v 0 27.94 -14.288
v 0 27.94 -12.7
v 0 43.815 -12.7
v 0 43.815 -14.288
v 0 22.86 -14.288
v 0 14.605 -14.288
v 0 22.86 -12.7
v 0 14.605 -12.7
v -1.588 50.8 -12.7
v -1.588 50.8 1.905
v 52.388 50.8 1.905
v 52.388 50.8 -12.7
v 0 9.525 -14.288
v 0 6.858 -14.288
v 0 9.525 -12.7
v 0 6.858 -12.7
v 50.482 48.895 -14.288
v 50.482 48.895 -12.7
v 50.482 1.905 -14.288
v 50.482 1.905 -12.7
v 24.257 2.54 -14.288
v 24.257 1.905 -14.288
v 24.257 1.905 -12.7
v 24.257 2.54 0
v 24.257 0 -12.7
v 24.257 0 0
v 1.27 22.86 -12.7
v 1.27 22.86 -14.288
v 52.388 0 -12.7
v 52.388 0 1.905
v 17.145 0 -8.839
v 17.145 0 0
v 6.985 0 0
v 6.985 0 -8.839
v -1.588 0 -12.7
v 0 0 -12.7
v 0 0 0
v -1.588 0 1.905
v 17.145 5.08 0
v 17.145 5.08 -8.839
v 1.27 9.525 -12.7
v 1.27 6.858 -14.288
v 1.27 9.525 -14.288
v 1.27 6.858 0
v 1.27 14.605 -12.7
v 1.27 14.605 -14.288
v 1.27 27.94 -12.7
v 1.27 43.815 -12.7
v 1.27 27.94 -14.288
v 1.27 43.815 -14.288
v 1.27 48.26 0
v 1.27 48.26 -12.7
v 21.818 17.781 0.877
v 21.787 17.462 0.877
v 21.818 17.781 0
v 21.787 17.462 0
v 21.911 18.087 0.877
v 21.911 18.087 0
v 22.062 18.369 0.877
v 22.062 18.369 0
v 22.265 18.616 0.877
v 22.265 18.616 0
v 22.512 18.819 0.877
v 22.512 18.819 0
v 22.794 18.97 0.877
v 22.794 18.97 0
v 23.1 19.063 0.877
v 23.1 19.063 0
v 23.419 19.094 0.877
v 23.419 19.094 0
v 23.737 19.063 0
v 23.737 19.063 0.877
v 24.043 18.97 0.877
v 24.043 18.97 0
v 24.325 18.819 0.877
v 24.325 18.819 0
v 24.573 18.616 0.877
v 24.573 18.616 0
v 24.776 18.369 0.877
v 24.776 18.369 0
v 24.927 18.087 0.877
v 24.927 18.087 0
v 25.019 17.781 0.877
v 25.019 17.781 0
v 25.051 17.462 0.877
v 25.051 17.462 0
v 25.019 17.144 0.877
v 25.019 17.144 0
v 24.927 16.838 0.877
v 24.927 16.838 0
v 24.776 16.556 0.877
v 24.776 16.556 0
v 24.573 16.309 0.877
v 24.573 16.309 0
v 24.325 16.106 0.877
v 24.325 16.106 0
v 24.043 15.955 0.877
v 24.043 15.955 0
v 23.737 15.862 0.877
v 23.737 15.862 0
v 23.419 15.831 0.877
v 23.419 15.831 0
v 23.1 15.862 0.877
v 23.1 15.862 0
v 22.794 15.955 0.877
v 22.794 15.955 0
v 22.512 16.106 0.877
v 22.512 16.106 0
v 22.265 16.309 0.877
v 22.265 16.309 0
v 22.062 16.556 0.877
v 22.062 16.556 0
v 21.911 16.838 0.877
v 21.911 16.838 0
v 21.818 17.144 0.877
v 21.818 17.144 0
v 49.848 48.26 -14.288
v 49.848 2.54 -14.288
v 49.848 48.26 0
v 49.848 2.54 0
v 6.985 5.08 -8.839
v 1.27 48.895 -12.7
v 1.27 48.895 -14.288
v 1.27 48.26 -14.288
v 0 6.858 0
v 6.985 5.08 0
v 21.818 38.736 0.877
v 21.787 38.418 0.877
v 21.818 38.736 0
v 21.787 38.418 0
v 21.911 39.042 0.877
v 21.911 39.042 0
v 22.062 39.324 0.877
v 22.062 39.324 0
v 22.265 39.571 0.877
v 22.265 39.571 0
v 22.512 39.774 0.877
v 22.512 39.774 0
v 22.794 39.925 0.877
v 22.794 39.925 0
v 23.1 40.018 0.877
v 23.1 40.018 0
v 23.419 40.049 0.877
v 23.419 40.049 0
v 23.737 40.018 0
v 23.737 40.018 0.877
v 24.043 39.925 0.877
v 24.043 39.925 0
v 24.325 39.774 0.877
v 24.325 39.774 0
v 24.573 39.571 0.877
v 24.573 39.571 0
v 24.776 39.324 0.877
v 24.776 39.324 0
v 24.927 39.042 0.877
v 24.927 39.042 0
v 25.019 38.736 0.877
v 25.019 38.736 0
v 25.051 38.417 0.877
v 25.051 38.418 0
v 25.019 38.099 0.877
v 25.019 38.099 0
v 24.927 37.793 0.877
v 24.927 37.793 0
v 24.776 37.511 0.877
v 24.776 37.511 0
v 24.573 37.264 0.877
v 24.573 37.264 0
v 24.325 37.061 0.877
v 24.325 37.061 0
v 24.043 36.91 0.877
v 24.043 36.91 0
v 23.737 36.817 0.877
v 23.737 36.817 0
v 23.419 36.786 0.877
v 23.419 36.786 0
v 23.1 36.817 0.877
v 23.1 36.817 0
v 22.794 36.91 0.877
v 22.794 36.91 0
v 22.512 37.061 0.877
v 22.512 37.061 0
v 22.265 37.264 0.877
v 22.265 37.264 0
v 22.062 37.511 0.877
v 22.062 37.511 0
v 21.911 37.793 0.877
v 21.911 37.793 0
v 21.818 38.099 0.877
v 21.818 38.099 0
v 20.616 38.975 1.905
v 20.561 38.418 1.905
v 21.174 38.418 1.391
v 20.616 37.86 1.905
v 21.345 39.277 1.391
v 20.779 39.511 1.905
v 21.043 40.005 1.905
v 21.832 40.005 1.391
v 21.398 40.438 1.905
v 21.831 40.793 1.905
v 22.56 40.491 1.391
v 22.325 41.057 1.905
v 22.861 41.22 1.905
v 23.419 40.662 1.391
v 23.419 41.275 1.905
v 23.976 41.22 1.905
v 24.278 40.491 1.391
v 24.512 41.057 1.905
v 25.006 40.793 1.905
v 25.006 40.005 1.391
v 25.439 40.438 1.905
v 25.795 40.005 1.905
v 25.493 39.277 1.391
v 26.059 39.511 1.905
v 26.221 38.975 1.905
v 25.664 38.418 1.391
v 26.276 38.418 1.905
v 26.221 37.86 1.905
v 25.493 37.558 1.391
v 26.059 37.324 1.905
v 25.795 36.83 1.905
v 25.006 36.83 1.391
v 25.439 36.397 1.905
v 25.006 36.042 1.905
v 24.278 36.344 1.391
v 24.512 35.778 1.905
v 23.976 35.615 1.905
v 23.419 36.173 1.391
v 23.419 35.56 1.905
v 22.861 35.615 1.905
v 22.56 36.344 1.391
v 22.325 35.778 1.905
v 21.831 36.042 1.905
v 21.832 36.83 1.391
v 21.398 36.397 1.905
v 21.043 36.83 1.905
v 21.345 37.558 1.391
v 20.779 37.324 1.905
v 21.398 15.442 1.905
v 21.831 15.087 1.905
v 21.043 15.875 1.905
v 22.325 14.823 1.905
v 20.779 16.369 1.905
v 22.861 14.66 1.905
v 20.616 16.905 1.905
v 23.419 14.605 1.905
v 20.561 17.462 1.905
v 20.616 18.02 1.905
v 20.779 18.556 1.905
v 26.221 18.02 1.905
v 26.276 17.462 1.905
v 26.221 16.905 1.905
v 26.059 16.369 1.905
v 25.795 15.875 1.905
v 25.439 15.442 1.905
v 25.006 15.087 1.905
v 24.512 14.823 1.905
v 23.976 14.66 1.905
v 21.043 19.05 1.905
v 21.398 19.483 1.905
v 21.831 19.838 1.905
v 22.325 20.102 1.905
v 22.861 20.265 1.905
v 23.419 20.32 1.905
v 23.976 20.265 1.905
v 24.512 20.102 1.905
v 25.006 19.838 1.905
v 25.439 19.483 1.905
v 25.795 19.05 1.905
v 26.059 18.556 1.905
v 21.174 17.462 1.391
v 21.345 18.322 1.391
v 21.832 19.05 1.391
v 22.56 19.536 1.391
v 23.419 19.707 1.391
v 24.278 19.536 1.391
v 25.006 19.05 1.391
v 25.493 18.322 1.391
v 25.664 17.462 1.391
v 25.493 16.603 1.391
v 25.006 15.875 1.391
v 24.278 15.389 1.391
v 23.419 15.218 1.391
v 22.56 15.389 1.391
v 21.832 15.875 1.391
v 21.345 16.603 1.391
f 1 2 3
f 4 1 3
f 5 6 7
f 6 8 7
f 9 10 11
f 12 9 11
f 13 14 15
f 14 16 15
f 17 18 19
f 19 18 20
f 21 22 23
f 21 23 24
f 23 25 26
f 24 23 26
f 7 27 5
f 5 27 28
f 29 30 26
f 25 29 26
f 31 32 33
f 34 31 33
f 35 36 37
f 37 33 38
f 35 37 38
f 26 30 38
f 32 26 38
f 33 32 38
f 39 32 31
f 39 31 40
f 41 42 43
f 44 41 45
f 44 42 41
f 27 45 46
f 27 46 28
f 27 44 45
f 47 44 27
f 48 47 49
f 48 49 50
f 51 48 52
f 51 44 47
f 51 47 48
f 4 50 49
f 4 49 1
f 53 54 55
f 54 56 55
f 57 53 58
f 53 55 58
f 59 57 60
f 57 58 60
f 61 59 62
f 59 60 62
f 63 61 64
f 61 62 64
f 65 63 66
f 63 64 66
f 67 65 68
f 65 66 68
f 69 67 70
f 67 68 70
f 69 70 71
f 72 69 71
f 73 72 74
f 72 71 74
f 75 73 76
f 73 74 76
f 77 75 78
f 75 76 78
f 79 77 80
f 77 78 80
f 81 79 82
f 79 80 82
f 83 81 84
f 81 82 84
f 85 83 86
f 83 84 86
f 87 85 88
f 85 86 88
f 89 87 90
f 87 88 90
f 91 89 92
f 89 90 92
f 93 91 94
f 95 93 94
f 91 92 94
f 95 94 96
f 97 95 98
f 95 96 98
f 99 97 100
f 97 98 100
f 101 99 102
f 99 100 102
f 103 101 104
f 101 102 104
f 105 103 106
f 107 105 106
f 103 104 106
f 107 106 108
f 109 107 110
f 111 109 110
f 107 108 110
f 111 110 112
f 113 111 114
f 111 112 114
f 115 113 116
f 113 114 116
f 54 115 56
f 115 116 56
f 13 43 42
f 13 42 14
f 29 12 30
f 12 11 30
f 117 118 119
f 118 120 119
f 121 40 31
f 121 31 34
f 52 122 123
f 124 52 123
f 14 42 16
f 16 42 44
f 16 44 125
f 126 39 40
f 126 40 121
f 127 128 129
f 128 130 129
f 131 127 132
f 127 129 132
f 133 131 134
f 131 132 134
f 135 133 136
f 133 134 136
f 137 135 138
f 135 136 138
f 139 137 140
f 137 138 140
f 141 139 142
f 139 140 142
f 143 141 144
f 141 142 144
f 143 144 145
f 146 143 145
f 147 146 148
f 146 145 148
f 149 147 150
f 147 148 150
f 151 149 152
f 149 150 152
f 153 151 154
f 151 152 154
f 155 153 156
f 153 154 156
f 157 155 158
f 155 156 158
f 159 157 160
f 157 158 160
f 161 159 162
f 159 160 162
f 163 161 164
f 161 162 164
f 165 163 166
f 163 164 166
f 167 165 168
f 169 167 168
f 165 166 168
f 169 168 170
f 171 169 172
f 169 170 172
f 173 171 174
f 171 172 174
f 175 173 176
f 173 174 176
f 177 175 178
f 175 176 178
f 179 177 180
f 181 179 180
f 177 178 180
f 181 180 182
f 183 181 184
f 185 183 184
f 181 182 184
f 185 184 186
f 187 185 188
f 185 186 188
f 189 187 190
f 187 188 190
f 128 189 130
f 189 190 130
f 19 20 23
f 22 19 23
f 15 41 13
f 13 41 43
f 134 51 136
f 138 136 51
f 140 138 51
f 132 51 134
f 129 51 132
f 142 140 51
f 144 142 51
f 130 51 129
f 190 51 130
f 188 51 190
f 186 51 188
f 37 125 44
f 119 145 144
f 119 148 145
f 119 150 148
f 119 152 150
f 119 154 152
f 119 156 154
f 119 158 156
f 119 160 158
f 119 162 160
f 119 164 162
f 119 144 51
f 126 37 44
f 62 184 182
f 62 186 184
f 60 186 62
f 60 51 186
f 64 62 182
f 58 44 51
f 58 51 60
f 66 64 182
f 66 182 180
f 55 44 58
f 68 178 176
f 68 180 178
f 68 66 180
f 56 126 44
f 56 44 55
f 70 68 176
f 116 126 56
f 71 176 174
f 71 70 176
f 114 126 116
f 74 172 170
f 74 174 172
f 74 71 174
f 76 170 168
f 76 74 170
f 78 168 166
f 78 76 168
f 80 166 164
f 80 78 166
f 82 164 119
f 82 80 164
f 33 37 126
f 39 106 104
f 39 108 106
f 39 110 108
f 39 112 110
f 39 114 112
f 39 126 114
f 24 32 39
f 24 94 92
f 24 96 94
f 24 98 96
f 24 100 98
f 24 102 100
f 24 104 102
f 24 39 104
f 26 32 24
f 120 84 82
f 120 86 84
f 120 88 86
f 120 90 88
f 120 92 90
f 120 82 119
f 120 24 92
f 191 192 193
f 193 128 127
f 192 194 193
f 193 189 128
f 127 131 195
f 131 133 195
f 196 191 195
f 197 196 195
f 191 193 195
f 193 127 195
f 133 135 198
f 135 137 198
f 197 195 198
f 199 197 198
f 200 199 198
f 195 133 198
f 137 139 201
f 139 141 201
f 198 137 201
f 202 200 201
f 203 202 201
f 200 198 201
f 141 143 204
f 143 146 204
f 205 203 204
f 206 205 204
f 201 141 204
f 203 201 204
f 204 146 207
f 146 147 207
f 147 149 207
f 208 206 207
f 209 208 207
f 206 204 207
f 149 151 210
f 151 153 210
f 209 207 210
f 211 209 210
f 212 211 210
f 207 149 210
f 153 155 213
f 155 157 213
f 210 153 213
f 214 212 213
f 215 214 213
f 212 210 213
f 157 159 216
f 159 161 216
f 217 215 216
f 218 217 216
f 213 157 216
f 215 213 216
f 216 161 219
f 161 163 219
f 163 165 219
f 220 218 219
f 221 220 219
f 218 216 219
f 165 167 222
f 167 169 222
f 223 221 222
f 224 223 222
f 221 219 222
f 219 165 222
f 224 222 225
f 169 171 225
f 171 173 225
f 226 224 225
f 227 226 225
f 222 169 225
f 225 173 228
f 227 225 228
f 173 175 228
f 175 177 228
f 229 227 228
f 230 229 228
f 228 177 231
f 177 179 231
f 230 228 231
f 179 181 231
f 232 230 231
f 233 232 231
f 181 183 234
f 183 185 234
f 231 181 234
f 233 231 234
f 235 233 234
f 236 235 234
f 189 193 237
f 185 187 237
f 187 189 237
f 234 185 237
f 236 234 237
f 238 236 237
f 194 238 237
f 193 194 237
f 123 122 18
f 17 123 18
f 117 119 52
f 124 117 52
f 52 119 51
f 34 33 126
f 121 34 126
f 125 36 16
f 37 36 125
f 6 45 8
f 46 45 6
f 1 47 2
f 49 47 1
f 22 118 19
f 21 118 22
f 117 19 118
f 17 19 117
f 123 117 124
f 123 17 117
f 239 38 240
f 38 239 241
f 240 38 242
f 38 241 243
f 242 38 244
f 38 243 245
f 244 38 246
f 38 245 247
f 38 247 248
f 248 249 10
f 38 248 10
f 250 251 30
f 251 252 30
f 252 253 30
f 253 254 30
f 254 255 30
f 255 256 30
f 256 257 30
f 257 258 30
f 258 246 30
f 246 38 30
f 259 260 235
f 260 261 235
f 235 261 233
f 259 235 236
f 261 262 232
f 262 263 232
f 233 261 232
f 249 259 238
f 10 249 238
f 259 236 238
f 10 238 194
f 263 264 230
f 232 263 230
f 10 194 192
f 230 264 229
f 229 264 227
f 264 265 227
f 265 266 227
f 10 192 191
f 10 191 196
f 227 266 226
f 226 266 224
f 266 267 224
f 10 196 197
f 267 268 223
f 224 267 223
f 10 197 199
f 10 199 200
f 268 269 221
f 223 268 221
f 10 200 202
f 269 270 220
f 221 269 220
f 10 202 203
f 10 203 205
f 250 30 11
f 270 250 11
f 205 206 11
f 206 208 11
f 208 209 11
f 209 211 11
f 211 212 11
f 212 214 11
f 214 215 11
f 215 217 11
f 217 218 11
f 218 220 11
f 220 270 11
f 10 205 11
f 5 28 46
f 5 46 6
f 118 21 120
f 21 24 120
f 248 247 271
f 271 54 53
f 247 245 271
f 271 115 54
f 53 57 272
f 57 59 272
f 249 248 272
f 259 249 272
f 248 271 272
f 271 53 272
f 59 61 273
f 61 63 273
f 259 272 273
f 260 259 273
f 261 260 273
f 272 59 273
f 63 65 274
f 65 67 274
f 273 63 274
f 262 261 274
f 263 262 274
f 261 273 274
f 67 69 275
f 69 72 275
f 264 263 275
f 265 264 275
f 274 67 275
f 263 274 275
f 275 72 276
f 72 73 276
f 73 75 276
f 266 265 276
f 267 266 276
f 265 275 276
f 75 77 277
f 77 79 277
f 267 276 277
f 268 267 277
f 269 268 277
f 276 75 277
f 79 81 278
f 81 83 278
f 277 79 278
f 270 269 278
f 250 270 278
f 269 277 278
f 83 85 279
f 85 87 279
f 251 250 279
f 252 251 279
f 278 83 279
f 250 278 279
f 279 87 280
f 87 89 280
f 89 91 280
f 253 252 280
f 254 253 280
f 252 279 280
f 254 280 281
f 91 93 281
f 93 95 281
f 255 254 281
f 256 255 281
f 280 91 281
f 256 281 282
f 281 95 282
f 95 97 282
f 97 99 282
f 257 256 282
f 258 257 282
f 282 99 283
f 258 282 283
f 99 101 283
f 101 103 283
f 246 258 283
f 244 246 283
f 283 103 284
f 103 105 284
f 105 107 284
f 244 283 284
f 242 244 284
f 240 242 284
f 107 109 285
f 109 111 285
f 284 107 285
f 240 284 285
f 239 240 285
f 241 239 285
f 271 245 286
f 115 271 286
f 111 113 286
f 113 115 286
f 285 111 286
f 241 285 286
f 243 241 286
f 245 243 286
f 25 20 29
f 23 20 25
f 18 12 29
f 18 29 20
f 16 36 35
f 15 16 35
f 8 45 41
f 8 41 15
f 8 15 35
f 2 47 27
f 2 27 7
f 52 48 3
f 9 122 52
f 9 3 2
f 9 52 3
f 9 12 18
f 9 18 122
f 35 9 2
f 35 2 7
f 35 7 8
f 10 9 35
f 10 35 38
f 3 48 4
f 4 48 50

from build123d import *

# Parameters (mm, degrees)
SKETCH1_W                                         = 52.3875
SKETCH1_H                                         = 50.8
BOSS_EXTRUDE1_DEPTH                               = 1.905
SKETCH2_W                                         = 14.605
SKETCH2_H                                         = 50.8
BOSS_EXTRUDE2_DEPTH                               = 1.5875
BOSS_EXTRUDE3_DEPTH                               = 12.7
CUT_EXTRUDE1_REACH                                = 76.07
SKETCH4_W                                         = 10.16
SKETCH4_H                                         = 3.8608
CUT_EXTRUDE2_REACH                                = 76.07
SKETCH5_W                                         = 6.985
SKETCH5_H                                         = 12.7
SKETCH5_W_2                                       = 7.112
SKETCH6_W                                         = 10.16
SKETCH6_H                                         = 2.54
BOSS_EXTRUDE4_DEPTH                               = 8.8392
SKETCH8_W                                         = 1.27
SKETCH8_H                                         = 41.402
BOSS_EXTRUDE5_DEPTH                               = 14.2875
BOSS_EXTRUDE6_DEPTH                               = 1.5875
CUT_EXTRUDE3_REACH                                = 75.47
SKETCH11_W                                        = 1.5875
SKETCH11_H                                        = 5.08
CSK_FOR_4_FLAT_HEAD_MACHINE_SCREW_100_D           = 3.2639
CSK_FOR_4_FLAT_HEAD_MACHINE_SCREW_100_DEPTH       = 7.493
CSK_FOR_4_FLAT_HEAD_MACHINE_SCREW_100_CSINK_D     = 5.715
CSK_FOR_4_FLAT_HEAD_MACHINE_SCREW_100_CSINK_ANGLE = 100
CSK_FOR_4_FLAT_HEAD_MACHINE_SCREW_100_TIP         = 0.980574487


with BuildPart() as part:
    # Sketch1 → Boss-Extrude1 (new body)
    with BuildSketch(Plane.XY):
        with Locations((26.19375, 25.4)):
            Rectangle(SKETCH1_W, SKETCH1_H)
    extrude(amount=BOSS_EXTRUDE1_DEPTH)

    # Sketch2 → Boss-Extrude2 (add)
    with BuildSketch(Plane.ZY):
        with Locations((-5.3975, 25.4)):
            Rectangle(SKETCH2_W, SKETCH2_H)
    extrude(amount=BOSS_EXTRUDE2_DEPTH)

    # Sketch3 → Boss-Extrude3 (add)
    with BuildSketch(Plane(origin=(0, 0, 0), x_dir=(-1, 0, 0), z_dir=(0, 0, -1))):
        Polygon((0, 50.8), (-52.3875, 50.8), (-52.3875, 0), (0, 0), (0, 2.54), (-49.8475, 2.54), (-49.8475, 48.26), (0, 48.26), align=None)
    extrude(amount=BOSS_EXTRUDE3_DEPTH)

    # Sketch4 → Cut-Extrude1 (cut, up to next)
    with BuildSketch(Plane.XZ, mode=Mode.PRIVATE) as cut_extrude1_sk1:
        with Locations((12.065, -10.7696)):
            Rectangle(SKETCH4_W, SKETCH4_H)
    cut_extrude1_tool1 = extrude(cut_extrude1_sk1.sketch, amount=-CUT_EXTRUDE1_REACH, mode=Mode.PRIVATE) & part.part
    add(cut_extrude1_tool1.solids().sort_by_distance((12.065, 0, -10.7696))[0], mode=Mode.SUBTRACT)

    # Sketch5 → Cut-Extrude2 (cut, up to next)
    with BuildSketch(Plane.XZ, mode=Mode.PRIVATE) as cut_extrude2_sk1:
        with Locations((3.4925, -6.35)):
            Rectangle(SKETCH5_W, SKETCH5_H)
    cut_extrude2_tool1 = extrude(cut_extrude2_sk1.sketch, amount=-CUT_EXTRUDE2_REACH, mode=Mode.PRIVATE) & part.part
    # Sketch5 → Cut-Extrude2 (cut, up to next)
    with BuildSketch(Plane.XZ, mode=Mode.PRIVATE) as cut_extrude2_sk2:
        with Locations((20.701, -6.35)):
            Rectangle(SKETCH5_W_2, SKETCH5_H)
    cut_extrude2_tool2 = extrude(cut_extrude2_sk2.sketch, amount=-CUT_EXTRUDE2_REACH, mode=Mode.PRIVATE) & part.part
    add(cut_extrude2_tool1.solids().sort_by_distance((3.4925, 0, -6.35))[0], mode=Mode.SUBTRACT)
    add(cut_extrude2_tool2.solids().sort_by_distance((20.701, 0, -6.35))[0], mode=Mode.SUBTRACT)

    # Sketch6 → Boss-Extrude4 (add)
    with BuildSketch(Plane(origin=(0, 0, 0), x_dir=(-1, 0, 0), z_dir=(0, 0, -1))):
        with Locations((-12.065, 3.81)):
            Rectangle(SKETCH6_W, SKETCH6_H)
    extrude(amount=BOSS_EXTRUDE4_DEPTH)

    # Sketch8 → Boss-Extrude5 (add)
    with BuildSketch(Plane(origin=(0, 0, 0), x_dir=(-1, 0, 0), z_dir=(0, 0, -1))):
        with Locations((-0.635, 27.559)):
            Rectangle(SKETCH8_W, SKETCH8_H)
    extrude(amount=BOSS_EXTRUDE5_DEPTH)

    # Sketch9 → Boss-Extrude6 (add)
    with BuildSketch(Plane(origin=(0, 0, -12.7), x_dir=(-1, 0, 0), z_dir=(0, 0, -1))):
        Polygon((0, 48.26), (0, 48.895), (-50.4825, 48.895), (-50.4825, 1.905), (-24.257, 1.905), (-24.257, 2.54), (-49.8475, 2.54), (-49.8475, 48.26), align=None)
    extrude(amount=BOSS_EXTRUDE6_DEPTH)

    # Sketch11 → Cut-Extrude3 (cut, up to next)
    with BuildSketch(Plane(origin=(1.27, 0, 0), x_dir=(0, 0, -1), z_dir=(1, 0, 0)), mode=Mode.PRIVATE) as cut_extrude3_sk1:
        with Locations((13.49375, 25.4)):
            Rectangle(SKETCH11_W, SKETCH11_H)
    cut_extrude3_tool1 = extrude(cut_extrude3_sk1.sketch, amount=-CUT_EXTRUDE3_REACH, mode=Mode.PRIVATE) & part.part
    # Sketch11 → Cut-Extrude3 (cut, up to next)
    with BuildSketch(Plane(origin=(1.27, 0, 0), x_dir=(0, 0, -1), z_dir=(1, 0, 0)), mode=Mode.PRIVATE) as cut_extrude3_sk2:
        with Locations((13.49375, 12.065)):
            Rectangle(SKETCH11_W, SKETCH11_H)
    cut_extrude3_tool2 = extrude(cut_extrude3_sk2.sketch, amount=-CUT_EXTRUDE3_REACH, mode=Mode.PRIVATE) & part.part
    # Sketch11 → Cut-Extrude3 (cut, up to next)
    with BuildSketch(Plane(origin=(1.27, 0, 0), x_dir=(0, 0, -1), z_dir=(1, 0, 0)), mode=Mode.PRIVATE) as cut_extrude3_sk3:
        with Locations((13.49375, 46.355)):
            Rectangle(SKETCH11_W, SKETCH11_H)
    cut_extrude3_tool3 = extrude(cut_extrude3_sk3.sketch, amount=-CUT_EXTRUDE3_REACH, mode=Mode.PRIVATE) & part.part
    add(cut_extrude3_tool1.solids().sort_by_distance((1.27, 25.4, -13.49375))[0], mode=Mode.SUBTRACT)
    add(cut_extrude3_tool2.solids().sort_by_distance((1.27, 12.065, -13.49375))[0], mode=Mode.SUBTRACT)
    add(cut_extrude3_tool3.solids().sort_by_distance((1.27, 46.355, -13.49375))[0], mode=Mode.SUBTRACT)

    # CSK for #4 Flat Head Machine Screw (100)1
    with Locations(Plane.XY.offset(1.905)):
        with Locations((23.4188, 38.4175), (23.4188, 17.4625)):
            CounterSinkHole(CSK_FOR_4_FLAT_HEAD_MACHINE_SCREW_100_D / 2, CSK_FOR_4_FLAT_HEAD_MACHINE_SCREW_100_CSINK_D / 2, depth=CSK_FOR_4_FLAT_HEAD_MACHINE_SCREW_100_DEPTH, counter_sink_angle=CSK_FOR_4_FLAT_HEAD_MACHINE_SCREW_100_CSINK_ANGLE)
            with Locations((0, 0, -(CSK_FOR_4_FLAT_HEAD_MACHINE_SCREW_100_DEPTH + CSK_FOR_4_FLAT_HEAD_MACHINE_SCREW_100_TIP / 2))):  # 118° drill point
                Cone(0, CSK_FOR_4_FLAT_HEAD_MACHINE_SCREW_100_D / 2, CSK_FOR_4_FLAT_HEAD_MACHINE_SCREW_100_TIP, mode=Mode.SUBTRACT)


solid = part.part
